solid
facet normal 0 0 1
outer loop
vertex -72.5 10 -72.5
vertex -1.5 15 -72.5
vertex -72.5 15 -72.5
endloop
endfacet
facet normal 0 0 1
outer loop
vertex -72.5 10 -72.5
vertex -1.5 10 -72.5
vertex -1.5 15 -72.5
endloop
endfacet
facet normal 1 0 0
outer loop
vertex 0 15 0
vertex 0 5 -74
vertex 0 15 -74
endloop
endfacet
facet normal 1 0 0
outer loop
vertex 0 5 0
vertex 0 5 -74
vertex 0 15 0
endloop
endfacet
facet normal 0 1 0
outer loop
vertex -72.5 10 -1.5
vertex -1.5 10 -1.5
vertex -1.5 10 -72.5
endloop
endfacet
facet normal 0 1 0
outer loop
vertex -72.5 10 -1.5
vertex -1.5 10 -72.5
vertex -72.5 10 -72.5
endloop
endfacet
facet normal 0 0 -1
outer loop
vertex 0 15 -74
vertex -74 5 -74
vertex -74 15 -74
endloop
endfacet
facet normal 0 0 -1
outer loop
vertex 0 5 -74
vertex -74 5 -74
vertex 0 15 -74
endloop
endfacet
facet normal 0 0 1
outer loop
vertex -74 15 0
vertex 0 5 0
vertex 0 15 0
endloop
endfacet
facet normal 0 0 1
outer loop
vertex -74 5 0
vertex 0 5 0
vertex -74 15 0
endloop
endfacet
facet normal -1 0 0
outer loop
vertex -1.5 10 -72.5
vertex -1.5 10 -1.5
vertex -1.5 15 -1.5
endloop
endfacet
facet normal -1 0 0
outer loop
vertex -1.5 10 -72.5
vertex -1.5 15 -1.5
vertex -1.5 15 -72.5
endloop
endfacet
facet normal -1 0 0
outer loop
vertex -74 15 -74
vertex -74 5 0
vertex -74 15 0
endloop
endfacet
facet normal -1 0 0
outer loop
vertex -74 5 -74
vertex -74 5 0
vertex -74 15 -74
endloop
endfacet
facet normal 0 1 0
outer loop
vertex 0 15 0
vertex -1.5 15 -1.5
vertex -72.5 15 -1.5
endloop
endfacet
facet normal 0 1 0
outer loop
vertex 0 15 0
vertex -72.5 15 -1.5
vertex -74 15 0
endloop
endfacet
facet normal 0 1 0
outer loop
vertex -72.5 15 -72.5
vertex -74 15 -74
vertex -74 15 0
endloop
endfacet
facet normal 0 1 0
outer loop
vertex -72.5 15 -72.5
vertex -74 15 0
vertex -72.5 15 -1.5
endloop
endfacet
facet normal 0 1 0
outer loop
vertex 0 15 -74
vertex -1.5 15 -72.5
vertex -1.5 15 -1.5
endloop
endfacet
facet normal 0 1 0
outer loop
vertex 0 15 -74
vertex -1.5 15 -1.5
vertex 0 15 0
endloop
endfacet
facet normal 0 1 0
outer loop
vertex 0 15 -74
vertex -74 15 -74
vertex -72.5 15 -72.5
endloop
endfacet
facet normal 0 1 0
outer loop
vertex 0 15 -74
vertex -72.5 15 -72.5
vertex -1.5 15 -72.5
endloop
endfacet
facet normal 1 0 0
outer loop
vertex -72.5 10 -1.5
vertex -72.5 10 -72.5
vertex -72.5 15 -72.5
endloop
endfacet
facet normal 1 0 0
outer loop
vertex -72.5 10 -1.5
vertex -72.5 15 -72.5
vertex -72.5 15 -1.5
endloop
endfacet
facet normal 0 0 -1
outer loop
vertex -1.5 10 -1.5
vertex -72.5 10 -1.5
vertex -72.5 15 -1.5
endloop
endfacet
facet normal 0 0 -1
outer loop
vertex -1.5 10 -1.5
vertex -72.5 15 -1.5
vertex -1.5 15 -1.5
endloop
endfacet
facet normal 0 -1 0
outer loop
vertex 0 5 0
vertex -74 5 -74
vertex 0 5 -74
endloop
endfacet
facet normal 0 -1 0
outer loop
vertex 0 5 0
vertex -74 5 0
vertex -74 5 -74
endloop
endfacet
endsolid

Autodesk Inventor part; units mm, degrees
ref_plane "YZ Plane" through (0, 0, 0) normal (1, 0, 0) x (0, 1, 0)
ref_plane "XZ Plane" through (0, 0, 0) normal (0, 1, 0) x (-1, 0, 0)
ref_plane "XY Plane" through (0, 0, 0) normal (0, 0, 1) x (1, 0, 0)
sketch "Sketch1" plane through (0, 0, 0) normal (0, 1, 0) x (-1, 0, 0)
  line L0 (0, 0) -> (74, 0)
  line L1 (74, 0) -> (74, -74)
  line L2 (74, -74) -> (0, -74)
  line L3 (0, -74) -> (0, 0)
  dimension "d0" = 74
  dimension "d1" = 74
extrude "Extrusion1" add sketch "Sketch1" along normal blind 10
sketch "Sketch2" plane through (0, 10, 0) normal (0, 1, 0) x (1, 0, 0)
  line L0 (0, 0) -> (0, 74) projected
  line L1 (0, 74) -> (-74, 74) projected
  line L2 (0, 0) -> (-74, 0)
  line L3 (-74, 0) -> (-74, 74)
  line L4 (-74, 74) -> (0, 74)
  line L5 (0, 74) -> (0, 0)
  line L6 (-72.5, 72.5) -> (-72.5, 1.5)
  line L7 (-72.5, 1.5) -> (-1.5, 1.5)
  line L8 (-1.5, 1.5) -> (-1.5, 72.5)
  line L9 (-1.5, 72.5) -> (-72.5, 72.5)
  dimension "d4" = 1.5
extrude "Extrusion2" add sketch "Sketch2" along normal blind 5
sketch "Sketch3" plane through (0, 0, 0) normal (0, -1, 0) x (1, 0, 0)
  line L0 (0, 0) -> (0, -74) projected
  line L1 (0, 0) -> (-74, 0)
  line L2 (-74, 0) -> (-74, -74)
  line L3 (-74, -74) -> (0, -74)
  line L4 (0, -74) -> (0, 0)
extrude "Extrusion3" cut sketch "Sketch3" against normal blind 5
properties part number "DiffusorCap"
